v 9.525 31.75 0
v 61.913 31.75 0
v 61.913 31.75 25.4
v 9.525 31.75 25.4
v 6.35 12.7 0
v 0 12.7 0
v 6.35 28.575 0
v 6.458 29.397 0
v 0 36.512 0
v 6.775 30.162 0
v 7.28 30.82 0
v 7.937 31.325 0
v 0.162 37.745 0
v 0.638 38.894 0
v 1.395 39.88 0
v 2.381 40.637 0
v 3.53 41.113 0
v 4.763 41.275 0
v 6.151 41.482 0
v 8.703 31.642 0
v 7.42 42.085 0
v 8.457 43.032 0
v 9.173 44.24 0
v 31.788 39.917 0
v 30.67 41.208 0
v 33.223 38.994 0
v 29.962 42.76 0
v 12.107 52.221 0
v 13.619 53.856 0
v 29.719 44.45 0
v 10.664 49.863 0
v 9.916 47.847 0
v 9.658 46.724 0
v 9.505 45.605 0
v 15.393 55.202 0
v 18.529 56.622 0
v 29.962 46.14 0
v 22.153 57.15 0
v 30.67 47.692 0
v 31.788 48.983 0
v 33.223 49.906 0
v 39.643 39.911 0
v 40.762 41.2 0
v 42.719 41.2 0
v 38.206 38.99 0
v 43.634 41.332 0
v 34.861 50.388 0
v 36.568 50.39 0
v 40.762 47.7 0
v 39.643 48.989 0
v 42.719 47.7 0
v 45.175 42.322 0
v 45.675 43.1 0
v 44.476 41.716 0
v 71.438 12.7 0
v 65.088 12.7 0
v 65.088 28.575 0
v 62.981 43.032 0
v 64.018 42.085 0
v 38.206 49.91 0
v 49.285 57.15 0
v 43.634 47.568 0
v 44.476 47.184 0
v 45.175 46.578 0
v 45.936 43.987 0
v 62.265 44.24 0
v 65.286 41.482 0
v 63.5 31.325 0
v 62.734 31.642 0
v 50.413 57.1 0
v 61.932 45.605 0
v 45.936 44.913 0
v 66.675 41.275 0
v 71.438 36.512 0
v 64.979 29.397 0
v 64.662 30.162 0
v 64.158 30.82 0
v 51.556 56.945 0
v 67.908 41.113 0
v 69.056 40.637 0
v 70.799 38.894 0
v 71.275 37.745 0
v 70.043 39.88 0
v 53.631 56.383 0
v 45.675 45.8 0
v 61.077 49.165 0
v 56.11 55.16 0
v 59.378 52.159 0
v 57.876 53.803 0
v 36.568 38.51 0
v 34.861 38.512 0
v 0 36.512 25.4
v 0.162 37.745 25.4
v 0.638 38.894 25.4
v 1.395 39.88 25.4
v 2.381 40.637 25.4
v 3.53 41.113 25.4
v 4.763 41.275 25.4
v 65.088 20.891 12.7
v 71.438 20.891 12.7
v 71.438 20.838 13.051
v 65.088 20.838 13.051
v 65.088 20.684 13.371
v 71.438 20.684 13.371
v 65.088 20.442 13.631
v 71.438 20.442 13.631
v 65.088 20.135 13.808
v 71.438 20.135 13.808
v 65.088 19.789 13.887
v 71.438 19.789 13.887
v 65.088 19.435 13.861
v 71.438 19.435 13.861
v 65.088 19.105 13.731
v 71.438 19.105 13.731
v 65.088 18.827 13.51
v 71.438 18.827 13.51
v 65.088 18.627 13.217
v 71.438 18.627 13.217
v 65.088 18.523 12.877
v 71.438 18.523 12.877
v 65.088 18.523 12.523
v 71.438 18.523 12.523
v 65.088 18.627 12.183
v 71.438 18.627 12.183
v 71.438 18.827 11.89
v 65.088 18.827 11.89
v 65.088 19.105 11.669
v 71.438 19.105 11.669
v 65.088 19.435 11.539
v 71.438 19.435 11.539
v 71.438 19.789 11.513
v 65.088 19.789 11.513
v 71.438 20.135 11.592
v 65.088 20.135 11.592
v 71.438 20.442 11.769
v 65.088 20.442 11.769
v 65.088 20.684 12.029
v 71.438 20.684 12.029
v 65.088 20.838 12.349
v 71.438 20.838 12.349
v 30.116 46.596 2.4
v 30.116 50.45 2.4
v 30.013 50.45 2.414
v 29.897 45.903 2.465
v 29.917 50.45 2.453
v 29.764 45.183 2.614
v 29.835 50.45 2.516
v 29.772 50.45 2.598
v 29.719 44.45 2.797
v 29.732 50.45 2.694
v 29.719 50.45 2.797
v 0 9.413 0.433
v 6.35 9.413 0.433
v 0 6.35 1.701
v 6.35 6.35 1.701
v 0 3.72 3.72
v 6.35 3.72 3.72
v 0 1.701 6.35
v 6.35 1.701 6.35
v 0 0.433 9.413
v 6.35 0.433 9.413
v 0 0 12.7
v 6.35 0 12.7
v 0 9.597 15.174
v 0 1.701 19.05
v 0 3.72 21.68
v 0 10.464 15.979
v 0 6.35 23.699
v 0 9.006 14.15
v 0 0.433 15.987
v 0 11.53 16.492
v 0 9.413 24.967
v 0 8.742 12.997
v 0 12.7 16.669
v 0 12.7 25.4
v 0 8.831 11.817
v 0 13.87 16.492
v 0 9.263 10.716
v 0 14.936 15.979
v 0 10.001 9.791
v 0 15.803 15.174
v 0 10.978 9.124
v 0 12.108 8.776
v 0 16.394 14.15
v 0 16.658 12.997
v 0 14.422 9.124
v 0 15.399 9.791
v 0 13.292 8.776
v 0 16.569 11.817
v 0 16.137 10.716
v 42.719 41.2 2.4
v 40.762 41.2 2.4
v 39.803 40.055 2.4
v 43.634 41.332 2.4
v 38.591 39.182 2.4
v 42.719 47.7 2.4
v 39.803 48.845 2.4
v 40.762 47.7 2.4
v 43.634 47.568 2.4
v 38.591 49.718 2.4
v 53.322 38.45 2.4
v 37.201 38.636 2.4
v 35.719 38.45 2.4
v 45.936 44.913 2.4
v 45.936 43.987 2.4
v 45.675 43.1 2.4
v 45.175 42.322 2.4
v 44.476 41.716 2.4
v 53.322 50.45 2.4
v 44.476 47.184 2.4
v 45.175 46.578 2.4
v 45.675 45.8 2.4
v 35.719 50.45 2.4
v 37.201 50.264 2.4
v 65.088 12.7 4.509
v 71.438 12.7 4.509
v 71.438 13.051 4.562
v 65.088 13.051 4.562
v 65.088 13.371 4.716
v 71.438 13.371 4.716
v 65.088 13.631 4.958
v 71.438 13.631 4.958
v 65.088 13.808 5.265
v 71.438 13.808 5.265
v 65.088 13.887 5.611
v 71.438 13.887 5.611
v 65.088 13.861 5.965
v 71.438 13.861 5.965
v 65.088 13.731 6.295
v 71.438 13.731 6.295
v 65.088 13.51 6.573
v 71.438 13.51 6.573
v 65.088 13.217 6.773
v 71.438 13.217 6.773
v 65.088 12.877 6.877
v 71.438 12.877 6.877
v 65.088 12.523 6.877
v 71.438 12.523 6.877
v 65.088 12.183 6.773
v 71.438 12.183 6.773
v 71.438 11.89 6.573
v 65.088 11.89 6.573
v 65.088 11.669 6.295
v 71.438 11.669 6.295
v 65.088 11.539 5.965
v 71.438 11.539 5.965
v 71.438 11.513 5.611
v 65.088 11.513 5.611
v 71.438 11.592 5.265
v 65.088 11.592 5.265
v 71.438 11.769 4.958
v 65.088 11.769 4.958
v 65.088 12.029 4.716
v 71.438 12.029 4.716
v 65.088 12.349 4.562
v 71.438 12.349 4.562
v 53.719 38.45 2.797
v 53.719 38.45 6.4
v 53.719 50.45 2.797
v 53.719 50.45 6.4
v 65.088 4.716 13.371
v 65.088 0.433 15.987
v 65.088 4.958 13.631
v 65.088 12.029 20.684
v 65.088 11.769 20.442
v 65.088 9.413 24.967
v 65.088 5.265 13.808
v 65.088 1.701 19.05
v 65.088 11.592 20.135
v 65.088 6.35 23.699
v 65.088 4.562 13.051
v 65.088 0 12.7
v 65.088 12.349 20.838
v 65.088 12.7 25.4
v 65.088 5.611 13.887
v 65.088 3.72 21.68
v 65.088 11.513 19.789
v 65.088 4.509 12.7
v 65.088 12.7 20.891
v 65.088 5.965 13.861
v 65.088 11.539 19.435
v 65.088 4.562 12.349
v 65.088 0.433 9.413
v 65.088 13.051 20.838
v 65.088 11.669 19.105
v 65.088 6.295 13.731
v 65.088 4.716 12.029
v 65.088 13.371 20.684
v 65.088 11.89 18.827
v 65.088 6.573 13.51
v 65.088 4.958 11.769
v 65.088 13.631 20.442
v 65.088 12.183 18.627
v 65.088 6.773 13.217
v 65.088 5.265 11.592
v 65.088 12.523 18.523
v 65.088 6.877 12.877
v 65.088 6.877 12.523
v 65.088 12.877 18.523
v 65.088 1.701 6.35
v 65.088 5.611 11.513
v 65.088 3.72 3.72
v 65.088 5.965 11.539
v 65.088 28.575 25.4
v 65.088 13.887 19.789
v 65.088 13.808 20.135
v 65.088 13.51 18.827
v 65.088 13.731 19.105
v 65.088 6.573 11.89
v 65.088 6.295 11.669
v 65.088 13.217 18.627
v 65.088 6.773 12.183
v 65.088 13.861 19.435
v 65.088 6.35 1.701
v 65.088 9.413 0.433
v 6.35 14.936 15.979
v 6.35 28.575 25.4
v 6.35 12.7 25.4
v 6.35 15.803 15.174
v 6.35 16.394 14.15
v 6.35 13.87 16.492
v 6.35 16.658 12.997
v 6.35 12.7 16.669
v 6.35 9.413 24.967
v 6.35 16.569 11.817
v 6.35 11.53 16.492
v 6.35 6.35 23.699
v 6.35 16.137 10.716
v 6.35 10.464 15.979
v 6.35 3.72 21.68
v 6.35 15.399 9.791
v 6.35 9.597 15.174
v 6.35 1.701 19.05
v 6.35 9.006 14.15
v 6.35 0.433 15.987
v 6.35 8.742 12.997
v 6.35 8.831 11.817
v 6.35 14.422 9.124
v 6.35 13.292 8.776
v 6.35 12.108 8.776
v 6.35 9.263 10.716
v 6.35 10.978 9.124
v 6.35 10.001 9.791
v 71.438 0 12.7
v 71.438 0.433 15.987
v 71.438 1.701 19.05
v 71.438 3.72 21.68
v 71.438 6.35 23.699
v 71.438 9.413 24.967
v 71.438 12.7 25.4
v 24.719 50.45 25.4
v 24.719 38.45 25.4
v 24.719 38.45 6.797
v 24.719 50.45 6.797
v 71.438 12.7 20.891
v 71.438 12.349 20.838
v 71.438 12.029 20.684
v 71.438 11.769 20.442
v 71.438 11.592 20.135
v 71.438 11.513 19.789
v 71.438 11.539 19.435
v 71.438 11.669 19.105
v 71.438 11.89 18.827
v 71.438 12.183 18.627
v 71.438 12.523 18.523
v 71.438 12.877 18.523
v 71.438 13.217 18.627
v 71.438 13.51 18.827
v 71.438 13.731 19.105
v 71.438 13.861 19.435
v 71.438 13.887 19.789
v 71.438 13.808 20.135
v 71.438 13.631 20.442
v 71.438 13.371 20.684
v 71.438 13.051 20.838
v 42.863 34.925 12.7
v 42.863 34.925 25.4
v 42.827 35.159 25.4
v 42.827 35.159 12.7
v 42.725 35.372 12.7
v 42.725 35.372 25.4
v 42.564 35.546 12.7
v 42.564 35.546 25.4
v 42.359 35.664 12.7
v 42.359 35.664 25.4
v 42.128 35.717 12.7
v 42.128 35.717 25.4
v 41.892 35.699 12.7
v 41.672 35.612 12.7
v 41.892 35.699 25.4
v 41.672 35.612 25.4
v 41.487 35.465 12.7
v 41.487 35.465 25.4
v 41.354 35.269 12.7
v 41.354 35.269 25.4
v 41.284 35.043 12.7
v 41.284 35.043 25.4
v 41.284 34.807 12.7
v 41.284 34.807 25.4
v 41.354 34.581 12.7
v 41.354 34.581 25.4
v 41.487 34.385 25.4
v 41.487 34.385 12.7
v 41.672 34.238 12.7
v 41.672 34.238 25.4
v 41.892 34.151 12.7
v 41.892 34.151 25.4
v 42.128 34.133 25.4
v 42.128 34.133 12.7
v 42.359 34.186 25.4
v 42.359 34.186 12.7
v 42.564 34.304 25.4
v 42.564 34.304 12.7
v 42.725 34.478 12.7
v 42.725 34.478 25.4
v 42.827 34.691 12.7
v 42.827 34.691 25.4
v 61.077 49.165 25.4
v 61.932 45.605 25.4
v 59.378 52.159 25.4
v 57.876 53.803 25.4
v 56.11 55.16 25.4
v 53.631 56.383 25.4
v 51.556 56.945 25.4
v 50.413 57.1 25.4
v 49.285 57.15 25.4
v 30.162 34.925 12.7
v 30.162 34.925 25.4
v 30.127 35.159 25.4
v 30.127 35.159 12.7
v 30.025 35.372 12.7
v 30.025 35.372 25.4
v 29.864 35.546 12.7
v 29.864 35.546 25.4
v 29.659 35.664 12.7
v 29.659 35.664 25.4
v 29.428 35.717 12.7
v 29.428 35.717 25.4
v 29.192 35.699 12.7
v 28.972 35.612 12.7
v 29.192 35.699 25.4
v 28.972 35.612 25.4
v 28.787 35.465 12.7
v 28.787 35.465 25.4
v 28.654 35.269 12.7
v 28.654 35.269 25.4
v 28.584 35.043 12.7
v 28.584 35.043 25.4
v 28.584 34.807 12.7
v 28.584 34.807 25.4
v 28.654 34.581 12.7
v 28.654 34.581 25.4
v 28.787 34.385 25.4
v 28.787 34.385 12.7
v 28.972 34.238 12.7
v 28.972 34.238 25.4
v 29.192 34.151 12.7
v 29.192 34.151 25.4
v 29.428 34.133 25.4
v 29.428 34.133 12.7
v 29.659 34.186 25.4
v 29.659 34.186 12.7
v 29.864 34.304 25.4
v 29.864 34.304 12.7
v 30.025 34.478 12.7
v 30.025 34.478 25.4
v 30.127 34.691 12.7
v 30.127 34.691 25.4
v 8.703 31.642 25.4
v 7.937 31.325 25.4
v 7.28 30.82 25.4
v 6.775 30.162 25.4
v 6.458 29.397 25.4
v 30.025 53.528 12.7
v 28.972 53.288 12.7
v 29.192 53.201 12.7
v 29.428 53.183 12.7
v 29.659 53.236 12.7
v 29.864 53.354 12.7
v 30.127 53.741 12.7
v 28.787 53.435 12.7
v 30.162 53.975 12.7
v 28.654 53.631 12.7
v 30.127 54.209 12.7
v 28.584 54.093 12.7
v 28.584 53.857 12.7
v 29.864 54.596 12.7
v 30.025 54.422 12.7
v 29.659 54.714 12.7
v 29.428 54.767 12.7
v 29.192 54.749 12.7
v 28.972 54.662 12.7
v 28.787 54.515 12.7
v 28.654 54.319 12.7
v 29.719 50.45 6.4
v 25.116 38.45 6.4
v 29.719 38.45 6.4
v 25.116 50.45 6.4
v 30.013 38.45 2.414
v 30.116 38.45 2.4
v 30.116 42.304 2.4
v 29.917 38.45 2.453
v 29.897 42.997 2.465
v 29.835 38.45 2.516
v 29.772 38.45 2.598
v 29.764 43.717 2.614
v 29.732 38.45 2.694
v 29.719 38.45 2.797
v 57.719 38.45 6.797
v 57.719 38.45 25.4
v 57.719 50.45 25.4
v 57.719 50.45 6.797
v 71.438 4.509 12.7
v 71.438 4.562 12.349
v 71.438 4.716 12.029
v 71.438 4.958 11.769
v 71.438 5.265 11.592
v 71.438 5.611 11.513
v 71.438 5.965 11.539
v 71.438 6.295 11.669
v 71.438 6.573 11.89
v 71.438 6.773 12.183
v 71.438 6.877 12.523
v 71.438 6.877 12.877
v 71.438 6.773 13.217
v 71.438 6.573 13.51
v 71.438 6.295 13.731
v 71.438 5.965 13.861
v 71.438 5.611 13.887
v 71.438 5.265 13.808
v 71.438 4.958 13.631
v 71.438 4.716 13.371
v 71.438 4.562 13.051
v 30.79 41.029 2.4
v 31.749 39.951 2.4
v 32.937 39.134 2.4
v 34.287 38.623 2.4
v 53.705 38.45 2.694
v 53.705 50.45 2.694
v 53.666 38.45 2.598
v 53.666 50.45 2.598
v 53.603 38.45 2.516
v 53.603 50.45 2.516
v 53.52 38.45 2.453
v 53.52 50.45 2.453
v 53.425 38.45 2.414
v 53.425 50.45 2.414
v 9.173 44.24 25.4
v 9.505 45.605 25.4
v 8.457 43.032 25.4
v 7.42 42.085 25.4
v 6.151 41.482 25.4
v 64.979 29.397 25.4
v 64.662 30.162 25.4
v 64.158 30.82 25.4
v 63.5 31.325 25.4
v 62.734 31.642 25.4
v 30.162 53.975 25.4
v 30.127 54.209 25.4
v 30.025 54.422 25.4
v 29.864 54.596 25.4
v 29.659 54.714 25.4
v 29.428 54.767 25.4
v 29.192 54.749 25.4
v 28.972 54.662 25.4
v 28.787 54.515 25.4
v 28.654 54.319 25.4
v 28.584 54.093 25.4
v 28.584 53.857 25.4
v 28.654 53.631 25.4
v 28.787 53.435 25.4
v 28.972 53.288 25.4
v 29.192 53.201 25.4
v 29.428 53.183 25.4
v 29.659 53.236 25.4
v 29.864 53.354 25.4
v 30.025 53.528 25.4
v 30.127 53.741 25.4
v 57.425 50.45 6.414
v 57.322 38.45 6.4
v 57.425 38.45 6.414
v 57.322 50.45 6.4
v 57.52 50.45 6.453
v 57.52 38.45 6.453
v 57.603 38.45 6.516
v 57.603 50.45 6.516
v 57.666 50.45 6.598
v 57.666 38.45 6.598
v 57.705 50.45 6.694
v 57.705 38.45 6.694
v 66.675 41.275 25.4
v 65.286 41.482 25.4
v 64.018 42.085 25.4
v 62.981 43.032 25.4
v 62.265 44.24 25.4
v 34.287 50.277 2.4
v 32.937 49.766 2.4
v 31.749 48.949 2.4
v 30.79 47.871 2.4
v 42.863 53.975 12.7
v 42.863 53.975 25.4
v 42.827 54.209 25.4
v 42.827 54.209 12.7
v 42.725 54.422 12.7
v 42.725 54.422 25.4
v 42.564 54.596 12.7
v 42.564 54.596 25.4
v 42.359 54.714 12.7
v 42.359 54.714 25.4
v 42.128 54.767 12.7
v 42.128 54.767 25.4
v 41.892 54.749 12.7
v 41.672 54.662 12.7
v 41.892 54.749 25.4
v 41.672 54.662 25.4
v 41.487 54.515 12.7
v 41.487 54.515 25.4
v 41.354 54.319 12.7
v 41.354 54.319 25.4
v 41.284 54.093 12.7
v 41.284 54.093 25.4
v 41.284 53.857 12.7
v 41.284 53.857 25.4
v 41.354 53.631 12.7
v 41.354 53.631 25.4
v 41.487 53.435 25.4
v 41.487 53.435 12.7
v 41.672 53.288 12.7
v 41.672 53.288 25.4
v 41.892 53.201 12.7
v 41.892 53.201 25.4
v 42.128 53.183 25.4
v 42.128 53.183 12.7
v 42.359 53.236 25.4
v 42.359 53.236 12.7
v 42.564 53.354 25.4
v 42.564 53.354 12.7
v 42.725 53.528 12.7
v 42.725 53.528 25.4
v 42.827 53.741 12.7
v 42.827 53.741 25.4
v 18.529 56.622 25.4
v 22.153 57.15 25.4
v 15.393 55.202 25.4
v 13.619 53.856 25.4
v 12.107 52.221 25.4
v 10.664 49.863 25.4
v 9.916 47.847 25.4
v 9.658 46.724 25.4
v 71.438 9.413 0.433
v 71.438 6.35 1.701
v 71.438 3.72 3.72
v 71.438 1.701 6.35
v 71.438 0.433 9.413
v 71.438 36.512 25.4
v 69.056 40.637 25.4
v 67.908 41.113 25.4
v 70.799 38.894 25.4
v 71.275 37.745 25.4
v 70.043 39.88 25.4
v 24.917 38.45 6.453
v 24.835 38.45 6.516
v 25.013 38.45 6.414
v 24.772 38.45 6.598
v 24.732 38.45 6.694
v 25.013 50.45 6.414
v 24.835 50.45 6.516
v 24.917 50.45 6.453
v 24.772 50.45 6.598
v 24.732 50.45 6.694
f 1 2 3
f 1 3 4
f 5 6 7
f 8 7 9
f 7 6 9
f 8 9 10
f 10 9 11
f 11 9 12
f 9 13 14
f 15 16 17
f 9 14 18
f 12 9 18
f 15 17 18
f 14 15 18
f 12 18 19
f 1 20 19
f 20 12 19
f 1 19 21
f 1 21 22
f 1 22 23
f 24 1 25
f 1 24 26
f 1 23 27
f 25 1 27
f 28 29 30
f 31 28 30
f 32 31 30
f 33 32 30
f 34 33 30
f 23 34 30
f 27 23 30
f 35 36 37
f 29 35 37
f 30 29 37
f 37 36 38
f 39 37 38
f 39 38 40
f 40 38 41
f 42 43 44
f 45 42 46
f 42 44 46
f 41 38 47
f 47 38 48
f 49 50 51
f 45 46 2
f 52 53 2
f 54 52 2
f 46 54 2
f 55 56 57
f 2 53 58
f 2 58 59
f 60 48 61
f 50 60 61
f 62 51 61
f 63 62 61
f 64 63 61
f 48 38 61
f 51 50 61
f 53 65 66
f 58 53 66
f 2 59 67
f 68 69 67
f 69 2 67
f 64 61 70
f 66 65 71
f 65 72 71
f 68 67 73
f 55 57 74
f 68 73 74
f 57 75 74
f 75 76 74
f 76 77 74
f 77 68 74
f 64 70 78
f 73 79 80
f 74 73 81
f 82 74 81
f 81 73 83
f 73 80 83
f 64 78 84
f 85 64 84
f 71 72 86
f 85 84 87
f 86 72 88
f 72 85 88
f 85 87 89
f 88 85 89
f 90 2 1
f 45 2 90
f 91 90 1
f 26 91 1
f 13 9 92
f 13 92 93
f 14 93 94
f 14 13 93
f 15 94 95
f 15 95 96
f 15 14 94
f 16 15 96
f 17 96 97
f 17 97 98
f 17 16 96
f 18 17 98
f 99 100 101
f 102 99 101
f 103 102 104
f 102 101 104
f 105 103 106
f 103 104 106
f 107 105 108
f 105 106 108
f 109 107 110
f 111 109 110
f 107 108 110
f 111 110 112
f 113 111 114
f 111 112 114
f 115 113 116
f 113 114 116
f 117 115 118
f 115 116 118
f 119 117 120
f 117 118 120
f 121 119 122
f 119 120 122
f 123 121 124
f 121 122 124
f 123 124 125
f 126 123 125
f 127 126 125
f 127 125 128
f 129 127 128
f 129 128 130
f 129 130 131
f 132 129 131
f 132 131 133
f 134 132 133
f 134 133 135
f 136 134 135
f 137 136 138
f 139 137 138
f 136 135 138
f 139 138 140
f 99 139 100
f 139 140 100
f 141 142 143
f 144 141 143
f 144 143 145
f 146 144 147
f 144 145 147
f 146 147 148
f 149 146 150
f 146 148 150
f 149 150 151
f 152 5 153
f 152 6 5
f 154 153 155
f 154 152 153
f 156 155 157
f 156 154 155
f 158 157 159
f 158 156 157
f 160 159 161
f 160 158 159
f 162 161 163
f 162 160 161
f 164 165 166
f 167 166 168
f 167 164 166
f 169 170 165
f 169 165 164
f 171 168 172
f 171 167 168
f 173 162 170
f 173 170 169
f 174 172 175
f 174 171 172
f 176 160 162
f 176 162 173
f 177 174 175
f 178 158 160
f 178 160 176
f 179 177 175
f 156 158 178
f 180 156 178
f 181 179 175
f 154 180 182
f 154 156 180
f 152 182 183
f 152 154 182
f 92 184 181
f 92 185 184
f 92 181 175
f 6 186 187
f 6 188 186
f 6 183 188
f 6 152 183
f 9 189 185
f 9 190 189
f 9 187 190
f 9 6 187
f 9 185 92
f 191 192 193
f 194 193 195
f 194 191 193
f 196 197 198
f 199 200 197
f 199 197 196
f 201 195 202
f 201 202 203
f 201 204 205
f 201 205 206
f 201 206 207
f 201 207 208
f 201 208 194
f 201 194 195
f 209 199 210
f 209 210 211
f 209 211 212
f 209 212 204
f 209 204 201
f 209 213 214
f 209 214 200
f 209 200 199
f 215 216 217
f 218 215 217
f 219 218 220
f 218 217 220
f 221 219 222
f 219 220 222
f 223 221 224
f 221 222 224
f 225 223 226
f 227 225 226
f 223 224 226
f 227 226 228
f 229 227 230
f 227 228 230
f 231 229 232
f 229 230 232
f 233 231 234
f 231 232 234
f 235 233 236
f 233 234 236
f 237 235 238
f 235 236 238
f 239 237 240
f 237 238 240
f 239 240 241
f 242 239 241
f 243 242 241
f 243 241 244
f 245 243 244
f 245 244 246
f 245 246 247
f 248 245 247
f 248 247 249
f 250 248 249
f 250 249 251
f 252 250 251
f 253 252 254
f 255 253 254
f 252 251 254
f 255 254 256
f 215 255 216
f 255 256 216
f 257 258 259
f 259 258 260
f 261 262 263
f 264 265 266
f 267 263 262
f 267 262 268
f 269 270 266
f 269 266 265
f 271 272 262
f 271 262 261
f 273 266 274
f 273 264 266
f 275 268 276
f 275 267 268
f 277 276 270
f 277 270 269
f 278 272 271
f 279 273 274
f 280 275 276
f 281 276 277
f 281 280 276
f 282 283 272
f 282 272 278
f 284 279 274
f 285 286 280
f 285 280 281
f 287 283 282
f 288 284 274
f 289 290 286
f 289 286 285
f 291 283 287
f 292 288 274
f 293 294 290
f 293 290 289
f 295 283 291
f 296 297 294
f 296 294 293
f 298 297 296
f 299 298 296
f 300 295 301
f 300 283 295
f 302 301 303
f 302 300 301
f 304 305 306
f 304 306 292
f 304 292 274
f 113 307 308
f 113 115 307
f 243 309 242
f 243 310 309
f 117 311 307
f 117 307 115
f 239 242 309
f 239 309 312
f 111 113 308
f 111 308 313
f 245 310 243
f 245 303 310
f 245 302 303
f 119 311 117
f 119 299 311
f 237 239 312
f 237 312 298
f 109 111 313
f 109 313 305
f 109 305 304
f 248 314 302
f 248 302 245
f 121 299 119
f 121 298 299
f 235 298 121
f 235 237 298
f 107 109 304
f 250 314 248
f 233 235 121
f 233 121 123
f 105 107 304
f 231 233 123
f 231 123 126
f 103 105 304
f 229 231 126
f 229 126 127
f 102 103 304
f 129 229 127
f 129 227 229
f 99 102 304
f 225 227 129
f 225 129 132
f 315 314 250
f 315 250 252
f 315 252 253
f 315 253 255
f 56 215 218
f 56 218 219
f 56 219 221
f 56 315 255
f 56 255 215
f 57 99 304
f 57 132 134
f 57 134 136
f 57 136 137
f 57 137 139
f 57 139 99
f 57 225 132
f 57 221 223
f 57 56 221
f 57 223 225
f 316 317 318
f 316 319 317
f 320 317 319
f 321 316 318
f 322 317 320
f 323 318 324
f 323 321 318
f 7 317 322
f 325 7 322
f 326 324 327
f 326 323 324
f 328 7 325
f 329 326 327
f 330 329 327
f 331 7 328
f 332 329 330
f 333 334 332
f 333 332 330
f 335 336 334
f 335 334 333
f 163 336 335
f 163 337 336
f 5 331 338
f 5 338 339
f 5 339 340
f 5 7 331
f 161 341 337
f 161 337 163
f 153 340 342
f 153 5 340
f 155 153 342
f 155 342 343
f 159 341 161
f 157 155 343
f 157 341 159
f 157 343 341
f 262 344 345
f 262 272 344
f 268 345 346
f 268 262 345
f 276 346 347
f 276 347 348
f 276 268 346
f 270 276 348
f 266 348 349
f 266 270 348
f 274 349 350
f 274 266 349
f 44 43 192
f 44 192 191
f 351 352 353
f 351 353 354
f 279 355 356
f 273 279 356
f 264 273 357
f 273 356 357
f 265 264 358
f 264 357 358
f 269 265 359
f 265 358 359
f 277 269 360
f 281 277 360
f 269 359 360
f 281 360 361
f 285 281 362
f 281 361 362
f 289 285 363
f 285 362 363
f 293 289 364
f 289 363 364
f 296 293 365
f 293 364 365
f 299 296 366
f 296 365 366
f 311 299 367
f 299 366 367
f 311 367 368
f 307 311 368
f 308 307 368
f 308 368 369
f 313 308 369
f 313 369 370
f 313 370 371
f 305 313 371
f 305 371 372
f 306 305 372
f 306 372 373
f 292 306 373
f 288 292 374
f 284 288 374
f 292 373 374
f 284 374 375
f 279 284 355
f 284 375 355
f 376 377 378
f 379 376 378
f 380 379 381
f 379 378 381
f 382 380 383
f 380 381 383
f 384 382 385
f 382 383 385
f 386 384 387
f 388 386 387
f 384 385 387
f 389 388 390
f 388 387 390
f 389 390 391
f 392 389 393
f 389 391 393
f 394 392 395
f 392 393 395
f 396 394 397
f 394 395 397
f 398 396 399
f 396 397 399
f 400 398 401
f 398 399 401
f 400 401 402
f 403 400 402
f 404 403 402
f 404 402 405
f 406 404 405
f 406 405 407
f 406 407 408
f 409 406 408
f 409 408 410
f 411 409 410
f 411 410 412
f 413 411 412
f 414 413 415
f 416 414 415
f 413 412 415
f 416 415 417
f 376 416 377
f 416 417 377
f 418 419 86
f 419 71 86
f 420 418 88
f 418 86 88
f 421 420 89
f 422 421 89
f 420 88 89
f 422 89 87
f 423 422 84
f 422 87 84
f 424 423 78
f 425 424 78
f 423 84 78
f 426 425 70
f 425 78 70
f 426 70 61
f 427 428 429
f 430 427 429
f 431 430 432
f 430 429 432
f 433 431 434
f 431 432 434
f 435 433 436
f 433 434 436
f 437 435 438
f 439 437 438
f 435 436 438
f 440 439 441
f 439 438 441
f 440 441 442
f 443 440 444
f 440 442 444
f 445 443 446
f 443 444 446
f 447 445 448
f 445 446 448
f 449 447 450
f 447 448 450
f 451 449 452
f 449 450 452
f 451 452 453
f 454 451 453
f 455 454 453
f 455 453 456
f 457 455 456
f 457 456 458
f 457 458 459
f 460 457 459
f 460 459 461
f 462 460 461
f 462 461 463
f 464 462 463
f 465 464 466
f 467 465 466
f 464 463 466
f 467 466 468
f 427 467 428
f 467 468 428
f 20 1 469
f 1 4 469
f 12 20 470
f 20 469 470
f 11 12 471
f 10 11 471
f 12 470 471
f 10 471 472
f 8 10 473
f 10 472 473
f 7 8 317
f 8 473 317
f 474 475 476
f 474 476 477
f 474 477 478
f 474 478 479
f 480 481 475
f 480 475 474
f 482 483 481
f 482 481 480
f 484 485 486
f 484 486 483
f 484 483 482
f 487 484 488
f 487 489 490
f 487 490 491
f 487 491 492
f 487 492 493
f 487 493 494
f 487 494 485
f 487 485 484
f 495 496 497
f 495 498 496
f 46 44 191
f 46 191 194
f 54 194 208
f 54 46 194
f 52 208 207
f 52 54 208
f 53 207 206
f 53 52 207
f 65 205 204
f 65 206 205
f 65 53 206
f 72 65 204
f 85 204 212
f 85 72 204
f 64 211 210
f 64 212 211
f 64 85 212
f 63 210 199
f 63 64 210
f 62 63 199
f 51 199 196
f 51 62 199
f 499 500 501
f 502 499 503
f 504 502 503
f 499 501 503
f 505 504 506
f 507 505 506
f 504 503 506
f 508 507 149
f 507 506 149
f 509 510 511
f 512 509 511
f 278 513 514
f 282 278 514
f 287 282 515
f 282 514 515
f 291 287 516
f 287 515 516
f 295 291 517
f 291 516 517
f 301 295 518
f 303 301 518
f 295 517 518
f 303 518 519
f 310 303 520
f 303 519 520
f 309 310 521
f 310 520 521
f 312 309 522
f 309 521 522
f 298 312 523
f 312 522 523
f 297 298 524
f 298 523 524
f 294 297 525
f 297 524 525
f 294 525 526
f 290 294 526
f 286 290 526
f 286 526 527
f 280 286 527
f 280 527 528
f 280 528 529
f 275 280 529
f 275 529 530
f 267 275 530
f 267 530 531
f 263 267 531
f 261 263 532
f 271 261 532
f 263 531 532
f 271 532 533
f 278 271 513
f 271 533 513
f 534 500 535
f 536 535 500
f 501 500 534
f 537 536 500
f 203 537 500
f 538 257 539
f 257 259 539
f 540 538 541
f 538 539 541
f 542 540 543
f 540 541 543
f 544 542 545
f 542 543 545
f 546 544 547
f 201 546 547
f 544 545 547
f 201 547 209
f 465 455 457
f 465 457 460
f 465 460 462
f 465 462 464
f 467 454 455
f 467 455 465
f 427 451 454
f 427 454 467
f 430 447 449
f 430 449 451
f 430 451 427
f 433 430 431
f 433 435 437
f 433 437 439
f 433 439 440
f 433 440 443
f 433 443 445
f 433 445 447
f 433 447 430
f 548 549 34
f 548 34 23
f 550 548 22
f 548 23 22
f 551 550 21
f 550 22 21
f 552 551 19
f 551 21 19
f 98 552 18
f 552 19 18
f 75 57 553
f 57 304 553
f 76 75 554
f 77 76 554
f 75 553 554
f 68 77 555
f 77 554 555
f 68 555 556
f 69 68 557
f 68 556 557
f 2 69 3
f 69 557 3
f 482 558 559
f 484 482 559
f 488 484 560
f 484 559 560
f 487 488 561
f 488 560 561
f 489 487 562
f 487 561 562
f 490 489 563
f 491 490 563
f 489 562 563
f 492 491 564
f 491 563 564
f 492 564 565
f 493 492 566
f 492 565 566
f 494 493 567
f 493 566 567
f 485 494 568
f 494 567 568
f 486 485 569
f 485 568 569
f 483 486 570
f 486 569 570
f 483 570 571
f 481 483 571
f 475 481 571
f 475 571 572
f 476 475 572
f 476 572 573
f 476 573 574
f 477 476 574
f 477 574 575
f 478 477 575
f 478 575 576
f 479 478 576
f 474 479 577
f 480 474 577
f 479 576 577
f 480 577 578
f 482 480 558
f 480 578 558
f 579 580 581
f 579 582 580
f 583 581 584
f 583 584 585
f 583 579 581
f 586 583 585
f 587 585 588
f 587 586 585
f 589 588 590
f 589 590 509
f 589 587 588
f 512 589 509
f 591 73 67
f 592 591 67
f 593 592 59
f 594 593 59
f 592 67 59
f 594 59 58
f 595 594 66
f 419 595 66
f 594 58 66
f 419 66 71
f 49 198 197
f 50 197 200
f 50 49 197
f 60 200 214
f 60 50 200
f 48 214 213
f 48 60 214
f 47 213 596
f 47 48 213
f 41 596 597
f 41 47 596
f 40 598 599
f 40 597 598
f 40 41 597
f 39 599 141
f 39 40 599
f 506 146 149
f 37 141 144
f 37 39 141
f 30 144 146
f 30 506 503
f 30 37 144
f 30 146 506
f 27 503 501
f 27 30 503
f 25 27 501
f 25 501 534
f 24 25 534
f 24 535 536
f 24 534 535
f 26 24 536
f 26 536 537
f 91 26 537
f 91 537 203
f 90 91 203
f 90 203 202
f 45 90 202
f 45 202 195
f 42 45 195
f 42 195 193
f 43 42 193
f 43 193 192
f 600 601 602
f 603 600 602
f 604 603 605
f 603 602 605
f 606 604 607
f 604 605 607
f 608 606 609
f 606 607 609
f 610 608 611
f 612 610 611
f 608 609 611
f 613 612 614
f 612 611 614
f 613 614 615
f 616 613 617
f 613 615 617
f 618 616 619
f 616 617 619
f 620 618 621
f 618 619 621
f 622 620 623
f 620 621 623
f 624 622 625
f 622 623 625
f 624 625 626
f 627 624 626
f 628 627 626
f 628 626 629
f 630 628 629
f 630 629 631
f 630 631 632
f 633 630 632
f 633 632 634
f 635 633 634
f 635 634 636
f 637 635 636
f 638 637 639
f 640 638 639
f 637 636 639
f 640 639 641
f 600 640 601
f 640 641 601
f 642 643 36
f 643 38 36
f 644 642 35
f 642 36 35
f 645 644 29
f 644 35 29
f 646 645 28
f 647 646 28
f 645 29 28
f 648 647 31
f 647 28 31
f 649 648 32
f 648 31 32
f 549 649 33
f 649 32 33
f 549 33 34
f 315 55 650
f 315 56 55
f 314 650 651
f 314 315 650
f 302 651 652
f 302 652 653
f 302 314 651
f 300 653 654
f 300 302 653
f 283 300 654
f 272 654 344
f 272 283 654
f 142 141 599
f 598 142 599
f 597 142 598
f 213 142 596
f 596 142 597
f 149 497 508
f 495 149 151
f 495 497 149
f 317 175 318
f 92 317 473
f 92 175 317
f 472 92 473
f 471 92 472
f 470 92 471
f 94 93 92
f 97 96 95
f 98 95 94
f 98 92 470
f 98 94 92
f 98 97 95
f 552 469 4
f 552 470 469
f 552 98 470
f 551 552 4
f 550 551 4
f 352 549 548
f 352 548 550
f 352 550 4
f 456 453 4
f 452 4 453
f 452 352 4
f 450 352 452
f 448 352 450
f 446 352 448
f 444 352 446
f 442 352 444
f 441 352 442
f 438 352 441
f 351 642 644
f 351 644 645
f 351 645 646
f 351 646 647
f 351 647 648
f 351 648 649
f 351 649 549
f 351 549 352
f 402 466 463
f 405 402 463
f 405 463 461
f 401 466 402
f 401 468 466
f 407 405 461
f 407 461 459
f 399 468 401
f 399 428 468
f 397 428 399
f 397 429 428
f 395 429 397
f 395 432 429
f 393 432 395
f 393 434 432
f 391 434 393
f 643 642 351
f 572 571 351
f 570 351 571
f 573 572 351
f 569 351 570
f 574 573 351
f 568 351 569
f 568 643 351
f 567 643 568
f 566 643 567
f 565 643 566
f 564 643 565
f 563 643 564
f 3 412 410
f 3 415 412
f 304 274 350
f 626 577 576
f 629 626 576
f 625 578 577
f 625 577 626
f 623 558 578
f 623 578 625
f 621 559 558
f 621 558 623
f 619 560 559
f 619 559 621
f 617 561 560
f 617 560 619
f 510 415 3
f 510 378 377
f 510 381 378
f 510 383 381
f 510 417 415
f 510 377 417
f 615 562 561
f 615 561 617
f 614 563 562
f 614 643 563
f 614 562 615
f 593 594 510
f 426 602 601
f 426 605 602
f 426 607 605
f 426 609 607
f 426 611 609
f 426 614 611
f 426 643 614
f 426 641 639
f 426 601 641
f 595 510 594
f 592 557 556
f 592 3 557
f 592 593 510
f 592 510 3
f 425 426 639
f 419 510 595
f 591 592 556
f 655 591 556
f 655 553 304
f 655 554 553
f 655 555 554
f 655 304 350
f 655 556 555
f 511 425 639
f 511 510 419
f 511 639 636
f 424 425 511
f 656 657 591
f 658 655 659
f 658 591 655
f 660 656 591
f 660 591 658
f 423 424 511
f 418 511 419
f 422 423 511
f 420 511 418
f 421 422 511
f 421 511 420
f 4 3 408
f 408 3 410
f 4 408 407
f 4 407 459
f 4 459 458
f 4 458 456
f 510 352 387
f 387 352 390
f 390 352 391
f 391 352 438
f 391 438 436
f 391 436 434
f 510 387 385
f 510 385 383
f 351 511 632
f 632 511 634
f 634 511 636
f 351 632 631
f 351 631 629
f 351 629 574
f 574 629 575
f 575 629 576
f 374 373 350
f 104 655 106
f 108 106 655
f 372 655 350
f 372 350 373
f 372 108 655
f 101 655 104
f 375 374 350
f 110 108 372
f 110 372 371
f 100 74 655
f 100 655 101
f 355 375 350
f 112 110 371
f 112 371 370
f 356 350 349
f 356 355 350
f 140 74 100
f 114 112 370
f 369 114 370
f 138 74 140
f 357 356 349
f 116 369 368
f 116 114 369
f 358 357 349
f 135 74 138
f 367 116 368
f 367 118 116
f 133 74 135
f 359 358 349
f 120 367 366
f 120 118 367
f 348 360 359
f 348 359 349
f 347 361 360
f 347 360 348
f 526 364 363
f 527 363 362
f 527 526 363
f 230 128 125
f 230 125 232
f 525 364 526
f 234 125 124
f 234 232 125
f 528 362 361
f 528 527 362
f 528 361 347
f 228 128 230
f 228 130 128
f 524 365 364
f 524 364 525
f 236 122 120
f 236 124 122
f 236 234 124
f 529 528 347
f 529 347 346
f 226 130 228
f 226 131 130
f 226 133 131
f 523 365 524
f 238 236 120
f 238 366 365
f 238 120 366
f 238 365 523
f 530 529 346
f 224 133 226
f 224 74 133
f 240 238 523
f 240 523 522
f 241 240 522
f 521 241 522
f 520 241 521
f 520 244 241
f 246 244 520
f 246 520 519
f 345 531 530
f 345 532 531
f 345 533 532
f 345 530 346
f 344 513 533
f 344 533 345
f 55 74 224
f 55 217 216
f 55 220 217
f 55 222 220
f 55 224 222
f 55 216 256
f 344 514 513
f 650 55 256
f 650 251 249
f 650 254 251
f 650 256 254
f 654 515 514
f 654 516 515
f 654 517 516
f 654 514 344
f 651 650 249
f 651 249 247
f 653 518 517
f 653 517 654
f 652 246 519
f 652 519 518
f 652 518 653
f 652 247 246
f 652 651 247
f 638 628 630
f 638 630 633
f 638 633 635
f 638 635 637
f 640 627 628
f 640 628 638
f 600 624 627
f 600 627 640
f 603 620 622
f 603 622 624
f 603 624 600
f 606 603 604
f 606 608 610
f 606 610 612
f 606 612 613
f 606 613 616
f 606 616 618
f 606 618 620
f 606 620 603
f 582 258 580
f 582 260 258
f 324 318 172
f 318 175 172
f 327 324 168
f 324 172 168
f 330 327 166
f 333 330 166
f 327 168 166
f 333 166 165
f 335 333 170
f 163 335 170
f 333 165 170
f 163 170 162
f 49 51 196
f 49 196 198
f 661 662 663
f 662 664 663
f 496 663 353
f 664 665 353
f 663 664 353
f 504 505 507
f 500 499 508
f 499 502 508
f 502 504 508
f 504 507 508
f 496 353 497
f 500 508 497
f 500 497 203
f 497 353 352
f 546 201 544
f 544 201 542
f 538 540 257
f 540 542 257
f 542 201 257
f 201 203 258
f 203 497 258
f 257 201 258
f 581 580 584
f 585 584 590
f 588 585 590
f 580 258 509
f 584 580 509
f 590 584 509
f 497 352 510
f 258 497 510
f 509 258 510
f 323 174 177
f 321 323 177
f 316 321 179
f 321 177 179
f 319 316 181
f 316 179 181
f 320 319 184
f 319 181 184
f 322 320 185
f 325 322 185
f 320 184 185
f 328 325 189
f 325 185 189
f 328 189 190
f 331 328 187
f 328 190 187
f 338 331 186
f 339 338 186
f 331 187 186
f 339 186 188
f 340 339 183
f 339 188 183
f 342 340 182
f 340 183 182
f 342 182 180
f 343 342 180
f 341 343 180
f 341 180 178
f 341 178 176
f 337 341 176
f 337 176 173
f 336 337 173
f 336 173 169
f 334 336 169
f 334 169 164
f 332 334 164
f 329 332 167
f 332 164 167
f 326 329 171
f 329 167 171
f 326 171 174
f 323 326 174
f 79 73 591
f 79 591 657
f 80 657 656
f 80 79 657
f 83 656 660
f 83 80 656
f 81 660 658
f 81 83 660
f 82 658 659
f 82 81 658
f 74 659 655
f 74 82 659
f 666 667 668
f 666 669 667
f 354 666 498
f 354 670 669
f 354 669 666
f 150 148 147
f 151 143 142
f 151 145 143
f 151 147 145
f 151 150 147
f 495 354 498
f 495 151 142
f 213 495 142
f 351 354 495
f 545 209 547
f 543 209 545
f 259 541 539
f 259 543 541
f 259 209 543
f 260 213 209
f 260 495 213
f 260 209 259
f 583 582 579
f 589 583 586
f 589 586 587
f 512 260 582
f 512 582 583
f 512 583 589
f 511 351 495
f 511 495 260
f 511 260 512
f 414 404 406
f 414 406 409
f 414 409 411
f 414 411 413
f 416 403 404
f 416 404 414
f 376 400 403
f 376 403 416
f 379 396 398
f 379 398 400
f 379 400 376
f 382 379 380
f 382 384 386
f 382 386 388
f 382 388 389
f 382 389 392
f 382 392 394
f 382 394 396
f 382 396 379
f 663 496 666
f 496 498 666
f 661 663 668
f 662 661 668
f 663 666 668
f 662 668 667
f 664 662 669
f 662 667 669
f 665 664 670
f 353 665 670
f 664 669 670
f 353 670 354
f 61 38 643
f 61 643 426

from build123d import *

# Parameters (mm, degrees)
BOSS_EXTRUDE1_DEPTH     = 25.4
FILLET1_R               = 3.175
FILLET2_R               = 12.7
SKETCH3_R               = 1.190625
CUT_EXTRUDE1_DEPTH      = 6.35
CIRPATTERN1_COUNT       = 4
SKETCH4_R               = 3.96875
CUT_EXTRUDE2_DEPTH      = 6.35
SKETCH5_R               = 3.175
CUT_EXTRUDE3_DEPTH      = 25.4
SKETCH6_W               = 24
SKETCH6_H               = 12
CUT_EXTRUDE4_DEPTH      = 23
SKETCH7_W               = 5
SKETCH7_H               = 12
SKETCH7_W_2             = 4
CUT_EXTRUDE5_DEPTH      = 19
FILLET6_R               = 0.396875
CUT_EXTRUDE6_DEPTH      = 95.331537177
CUT_EXTRUDE6_DEPTH_BACK = 4
SKETCH9_W               = 9.525
SKETCH9_H               = 15.875
CUT_EXTRUDE7_DEPTH      = 25.4
FILLET7_DEPTH           = 25.4
FILLET7_2_DEPTH         = 25.4
FILLET8_R               = 12.7
SKETCH10_R              = 0.79375
CUT_EXTRUDE8_DEPTH      = 12.7


with BuildPart() as part:
    # Sketch2 → Boss-Extrude1 (new body)
    with BuildSketch(Plane.XY):
        Polygon((0, 0), (0, 57.15), (71.4375, 57.15), (71.4375, 0), (65.0875, 0), (65.0875, 31.75), (6.35, 31.75), (6.35, 0), align=None)
    extrude(amount=BOSS_EXTRUDE1_DEPTH)

    # Fillet1
    fillet1_edges = [part.edges().sort_by_distance(p)[0] for p in [
        (65.0875, 31.75, 12.7),
        (6.35, 31.75, 12.7),
    ]]
    fillet(fillet1_edges, radius=FILLET1_R)

    # Fillet2
    fillet2_edges = [part.edges().sort_by_distance(p)[0] for p in [
        (3.175, 0, 0),
        (68.2625, 0, 0),
        (3.175, 0, 25.4),
        (68.2625, 0, 25.4),
    ]]
    fillet(fillet2_edges, radius=FILLET2_R - 0.0001)  # a hair under: the kernel refuses the full size

    # Sketch3 → Cut-Extrude1 (cut)
    with BuildSketch(Plane(origin=(71.4375, 0, 0), x_dir=(0, 0, -1), z_dir=(1, 0, 0))):
        with Locations(Location((-12.7, 19.7, 0), (0, 0, 90))):
            Circle(SKETCH3_R)
    cut_extrude1 = extrude(amount=-CUT_EXTRUDE1_DEPTH, mode=Mode.SUBTRACT)

    # CirPattern1: Cut-Extrude1 ×4 about axis
    cirpattern1_axis = Axis((0, 12.7, 12.7), (1, 0, 0))
    for i in range(1, CIRPATTERN1_COUNT):
        add(cut_extrude1.rotate(cirpattern1_axis, i * 360 / CIRPATTERN1_COUNT), mode=Mode.SUBTRACT)

    # Sketch4 → Cut-Extrude2 (cut)
    with BuildSketch(Plane.ZY):
        with Locations((12.7, 12.7)):
            Circle(SKETCH4_R)
    extrude(amount=-CUT_EXTRUDE2_DEPTH, mode=Mode.SUBTRACT)

    # Sketch5 → Cut-Extrude3 (cut)
    with BuildSketch(Plane.XY.offset(25.4)):
        with Locations((35.71875, 44.45)):
            Circle(SKETCH5_R)
    extrude(amount=-CUT_EXTRUDE3_DEPTH, mode=Mode.SUBTRACT)

    # Sketch6 → Cut-Extrude4 (cut)
    with BuildSketch(Plane.XY.offset(25.4)):
        with Locations((41.71875, 44.45)):
            Rectangle(SKETCH6_W, SKETCH6_H)
    extrude(amount=-CUT_EXTRUDE4_DEPTH, mode=Mode.SUBTRACT)

    # Sketch7 → Cut-Extrude5 (cut)
    with BuildSketch(Plane.XY.offset(25.4)):
        with Locations((27.21875, 44.45)):
            Rectangle(SKETCH7_W, SKETCH7_H)
        with Locations((55.71875, 44.45)):
            Rectangle(SKETCH7_W_2, SKETCH7_H)
    extrude(amount=-CUT_EXTRUDE5_DEPTH, mode=Mode.SUBTRACT)

    # Fillet6
    fillet6_edges = [part.edges().sort_by_distance(p)[0] for p in [
        (24.71875, 44.45, 6.4),
        (57.71875, 44.45, 6.4),
        (53.71875, 44.45, 2.4),
        (29.71875, 44.45, 2.4),
    ]]
    fillet(fillet6_edges, radius=FILLET6_R)

    # Sketch8 → Cut-Extrude6 (cut, two sides: drawn at the far end of the back side and taken through both)
    with BuildSketch(Plane.XY.offset(2.4).offset(-CUT_EXTRUDE6_DEPTH_BACK)):
        with BuildLine():
            Line((42.71875, 47.7), (40.76231025, 47.7))
            ThreePointArc((40.76231025, 47.7), (29.71875, 44.45), (40.76231025, 41.2))
            Line((40.76231025, 41.2), (42.71875, 41.2))
            ThreePointArc((42.71875, 41.2), (45.96875, 44.45), (42.71875, 47.7))
        make_face()
    extrude(amount=CUT_EXTRUDE6_DEPTH + CUT_EXTRUDE6_DEPTH_BACK, mode=Mode.SUBTRACT)

    # Sketch9 → Cut-Extrude7 (cut)
    with BuildSketch(Plane.XY.offset(25.4)):
        with Locations((4.7625, 49.2125)):
            Rectangle(SKETCH9_W, SKETCH9_H)
        with Locations((66.675, 49.2125)):
            Rectangle(SKETCH9_W, SKETCH9_H)
    extrude(amount=-CUT_EXTRUDE7_DEPTH, mode=Mode.SUBTRACT)

    # Fillet7: read off the stored shape, not the designer's step
    # Fillet7 outline → Fillet7 (cut)
    with BuildSketch(Plane.XY):
        with BuildLine():
            ThreePointArc((66.675, 41.275), (70.042596045, 39.880096045), (71.4375, 36.5125))
            Line((71.4375, 36.5125), (71.4375, 41.275))
            Line((71.4375, 41.275), (66.675, 41.275))
        make_face()
        with BuildLine():
            ThreePointArc((0, 36.5125), (1.394903955, 39.880096045), (4.7625, 41.275))
            Line((4.7625, 41.275), (0, 41.275))
            Line((0, 41.275), (0, 36.5125))
        make_face()
    extrude(amount=FILLET7_DEPTH, mode=Mode.SUBTRACT)

    # Fillet7 2 outline → Fillet7 2 (add)
    with BuildSketch(Plane.XY):
        with BuildLine():
            Line((61.9125, 41.275), (66.675, 41.275))
            ThreePointArc((66.675, 41.275), (63.307403955, 42.669903955), (61.9125, 46.0375))
            Line((61.9125, 46.0375), (61.9125, 41.275))
        make_face()
        with BuildLine():
            ThreePointArc((9.525, 46.0375), (8.130096045, 42.669903955), (4.7625, 41.275))
            Line((4.7625, 41.275), (9.525, 41.275))
            Line((9.525, 41.275), (9.525, 46.0375))
        make_face()
    extrude(amount=FILLET7_2_DEPTH)

    # Fillet8
    fillet8_edges = [part.edges().sort_by_distance(p)[0] for p in [
        (9.525, 57.15, 12.7),
        (61.9125, 57.15, 12.7),
    ]]
    fillet(fillet8_edges, radius=FILLET8_R)

    # Sketch10 → Cut-Extrude8 (cut)
    with BuildSketch(Plane.XY.offset(25.4)):
        with Locations((29.36875, 53.975)):
            Circle(SKETCH10_R)
        with Locations((42.06875, 53.975)):
            Circle(SKETCH10_R)
        with Locations((29.36875, 34.925)):
            Circle(SKETCH10_R)
        with Locations((42.06875, 34.925)):
            Circle(SKETCH10_R)
    extrude(amount=-CUT_EXTRUDE8_DEPTH, mode=Mode.SUBTRACT)


solid = part.part
